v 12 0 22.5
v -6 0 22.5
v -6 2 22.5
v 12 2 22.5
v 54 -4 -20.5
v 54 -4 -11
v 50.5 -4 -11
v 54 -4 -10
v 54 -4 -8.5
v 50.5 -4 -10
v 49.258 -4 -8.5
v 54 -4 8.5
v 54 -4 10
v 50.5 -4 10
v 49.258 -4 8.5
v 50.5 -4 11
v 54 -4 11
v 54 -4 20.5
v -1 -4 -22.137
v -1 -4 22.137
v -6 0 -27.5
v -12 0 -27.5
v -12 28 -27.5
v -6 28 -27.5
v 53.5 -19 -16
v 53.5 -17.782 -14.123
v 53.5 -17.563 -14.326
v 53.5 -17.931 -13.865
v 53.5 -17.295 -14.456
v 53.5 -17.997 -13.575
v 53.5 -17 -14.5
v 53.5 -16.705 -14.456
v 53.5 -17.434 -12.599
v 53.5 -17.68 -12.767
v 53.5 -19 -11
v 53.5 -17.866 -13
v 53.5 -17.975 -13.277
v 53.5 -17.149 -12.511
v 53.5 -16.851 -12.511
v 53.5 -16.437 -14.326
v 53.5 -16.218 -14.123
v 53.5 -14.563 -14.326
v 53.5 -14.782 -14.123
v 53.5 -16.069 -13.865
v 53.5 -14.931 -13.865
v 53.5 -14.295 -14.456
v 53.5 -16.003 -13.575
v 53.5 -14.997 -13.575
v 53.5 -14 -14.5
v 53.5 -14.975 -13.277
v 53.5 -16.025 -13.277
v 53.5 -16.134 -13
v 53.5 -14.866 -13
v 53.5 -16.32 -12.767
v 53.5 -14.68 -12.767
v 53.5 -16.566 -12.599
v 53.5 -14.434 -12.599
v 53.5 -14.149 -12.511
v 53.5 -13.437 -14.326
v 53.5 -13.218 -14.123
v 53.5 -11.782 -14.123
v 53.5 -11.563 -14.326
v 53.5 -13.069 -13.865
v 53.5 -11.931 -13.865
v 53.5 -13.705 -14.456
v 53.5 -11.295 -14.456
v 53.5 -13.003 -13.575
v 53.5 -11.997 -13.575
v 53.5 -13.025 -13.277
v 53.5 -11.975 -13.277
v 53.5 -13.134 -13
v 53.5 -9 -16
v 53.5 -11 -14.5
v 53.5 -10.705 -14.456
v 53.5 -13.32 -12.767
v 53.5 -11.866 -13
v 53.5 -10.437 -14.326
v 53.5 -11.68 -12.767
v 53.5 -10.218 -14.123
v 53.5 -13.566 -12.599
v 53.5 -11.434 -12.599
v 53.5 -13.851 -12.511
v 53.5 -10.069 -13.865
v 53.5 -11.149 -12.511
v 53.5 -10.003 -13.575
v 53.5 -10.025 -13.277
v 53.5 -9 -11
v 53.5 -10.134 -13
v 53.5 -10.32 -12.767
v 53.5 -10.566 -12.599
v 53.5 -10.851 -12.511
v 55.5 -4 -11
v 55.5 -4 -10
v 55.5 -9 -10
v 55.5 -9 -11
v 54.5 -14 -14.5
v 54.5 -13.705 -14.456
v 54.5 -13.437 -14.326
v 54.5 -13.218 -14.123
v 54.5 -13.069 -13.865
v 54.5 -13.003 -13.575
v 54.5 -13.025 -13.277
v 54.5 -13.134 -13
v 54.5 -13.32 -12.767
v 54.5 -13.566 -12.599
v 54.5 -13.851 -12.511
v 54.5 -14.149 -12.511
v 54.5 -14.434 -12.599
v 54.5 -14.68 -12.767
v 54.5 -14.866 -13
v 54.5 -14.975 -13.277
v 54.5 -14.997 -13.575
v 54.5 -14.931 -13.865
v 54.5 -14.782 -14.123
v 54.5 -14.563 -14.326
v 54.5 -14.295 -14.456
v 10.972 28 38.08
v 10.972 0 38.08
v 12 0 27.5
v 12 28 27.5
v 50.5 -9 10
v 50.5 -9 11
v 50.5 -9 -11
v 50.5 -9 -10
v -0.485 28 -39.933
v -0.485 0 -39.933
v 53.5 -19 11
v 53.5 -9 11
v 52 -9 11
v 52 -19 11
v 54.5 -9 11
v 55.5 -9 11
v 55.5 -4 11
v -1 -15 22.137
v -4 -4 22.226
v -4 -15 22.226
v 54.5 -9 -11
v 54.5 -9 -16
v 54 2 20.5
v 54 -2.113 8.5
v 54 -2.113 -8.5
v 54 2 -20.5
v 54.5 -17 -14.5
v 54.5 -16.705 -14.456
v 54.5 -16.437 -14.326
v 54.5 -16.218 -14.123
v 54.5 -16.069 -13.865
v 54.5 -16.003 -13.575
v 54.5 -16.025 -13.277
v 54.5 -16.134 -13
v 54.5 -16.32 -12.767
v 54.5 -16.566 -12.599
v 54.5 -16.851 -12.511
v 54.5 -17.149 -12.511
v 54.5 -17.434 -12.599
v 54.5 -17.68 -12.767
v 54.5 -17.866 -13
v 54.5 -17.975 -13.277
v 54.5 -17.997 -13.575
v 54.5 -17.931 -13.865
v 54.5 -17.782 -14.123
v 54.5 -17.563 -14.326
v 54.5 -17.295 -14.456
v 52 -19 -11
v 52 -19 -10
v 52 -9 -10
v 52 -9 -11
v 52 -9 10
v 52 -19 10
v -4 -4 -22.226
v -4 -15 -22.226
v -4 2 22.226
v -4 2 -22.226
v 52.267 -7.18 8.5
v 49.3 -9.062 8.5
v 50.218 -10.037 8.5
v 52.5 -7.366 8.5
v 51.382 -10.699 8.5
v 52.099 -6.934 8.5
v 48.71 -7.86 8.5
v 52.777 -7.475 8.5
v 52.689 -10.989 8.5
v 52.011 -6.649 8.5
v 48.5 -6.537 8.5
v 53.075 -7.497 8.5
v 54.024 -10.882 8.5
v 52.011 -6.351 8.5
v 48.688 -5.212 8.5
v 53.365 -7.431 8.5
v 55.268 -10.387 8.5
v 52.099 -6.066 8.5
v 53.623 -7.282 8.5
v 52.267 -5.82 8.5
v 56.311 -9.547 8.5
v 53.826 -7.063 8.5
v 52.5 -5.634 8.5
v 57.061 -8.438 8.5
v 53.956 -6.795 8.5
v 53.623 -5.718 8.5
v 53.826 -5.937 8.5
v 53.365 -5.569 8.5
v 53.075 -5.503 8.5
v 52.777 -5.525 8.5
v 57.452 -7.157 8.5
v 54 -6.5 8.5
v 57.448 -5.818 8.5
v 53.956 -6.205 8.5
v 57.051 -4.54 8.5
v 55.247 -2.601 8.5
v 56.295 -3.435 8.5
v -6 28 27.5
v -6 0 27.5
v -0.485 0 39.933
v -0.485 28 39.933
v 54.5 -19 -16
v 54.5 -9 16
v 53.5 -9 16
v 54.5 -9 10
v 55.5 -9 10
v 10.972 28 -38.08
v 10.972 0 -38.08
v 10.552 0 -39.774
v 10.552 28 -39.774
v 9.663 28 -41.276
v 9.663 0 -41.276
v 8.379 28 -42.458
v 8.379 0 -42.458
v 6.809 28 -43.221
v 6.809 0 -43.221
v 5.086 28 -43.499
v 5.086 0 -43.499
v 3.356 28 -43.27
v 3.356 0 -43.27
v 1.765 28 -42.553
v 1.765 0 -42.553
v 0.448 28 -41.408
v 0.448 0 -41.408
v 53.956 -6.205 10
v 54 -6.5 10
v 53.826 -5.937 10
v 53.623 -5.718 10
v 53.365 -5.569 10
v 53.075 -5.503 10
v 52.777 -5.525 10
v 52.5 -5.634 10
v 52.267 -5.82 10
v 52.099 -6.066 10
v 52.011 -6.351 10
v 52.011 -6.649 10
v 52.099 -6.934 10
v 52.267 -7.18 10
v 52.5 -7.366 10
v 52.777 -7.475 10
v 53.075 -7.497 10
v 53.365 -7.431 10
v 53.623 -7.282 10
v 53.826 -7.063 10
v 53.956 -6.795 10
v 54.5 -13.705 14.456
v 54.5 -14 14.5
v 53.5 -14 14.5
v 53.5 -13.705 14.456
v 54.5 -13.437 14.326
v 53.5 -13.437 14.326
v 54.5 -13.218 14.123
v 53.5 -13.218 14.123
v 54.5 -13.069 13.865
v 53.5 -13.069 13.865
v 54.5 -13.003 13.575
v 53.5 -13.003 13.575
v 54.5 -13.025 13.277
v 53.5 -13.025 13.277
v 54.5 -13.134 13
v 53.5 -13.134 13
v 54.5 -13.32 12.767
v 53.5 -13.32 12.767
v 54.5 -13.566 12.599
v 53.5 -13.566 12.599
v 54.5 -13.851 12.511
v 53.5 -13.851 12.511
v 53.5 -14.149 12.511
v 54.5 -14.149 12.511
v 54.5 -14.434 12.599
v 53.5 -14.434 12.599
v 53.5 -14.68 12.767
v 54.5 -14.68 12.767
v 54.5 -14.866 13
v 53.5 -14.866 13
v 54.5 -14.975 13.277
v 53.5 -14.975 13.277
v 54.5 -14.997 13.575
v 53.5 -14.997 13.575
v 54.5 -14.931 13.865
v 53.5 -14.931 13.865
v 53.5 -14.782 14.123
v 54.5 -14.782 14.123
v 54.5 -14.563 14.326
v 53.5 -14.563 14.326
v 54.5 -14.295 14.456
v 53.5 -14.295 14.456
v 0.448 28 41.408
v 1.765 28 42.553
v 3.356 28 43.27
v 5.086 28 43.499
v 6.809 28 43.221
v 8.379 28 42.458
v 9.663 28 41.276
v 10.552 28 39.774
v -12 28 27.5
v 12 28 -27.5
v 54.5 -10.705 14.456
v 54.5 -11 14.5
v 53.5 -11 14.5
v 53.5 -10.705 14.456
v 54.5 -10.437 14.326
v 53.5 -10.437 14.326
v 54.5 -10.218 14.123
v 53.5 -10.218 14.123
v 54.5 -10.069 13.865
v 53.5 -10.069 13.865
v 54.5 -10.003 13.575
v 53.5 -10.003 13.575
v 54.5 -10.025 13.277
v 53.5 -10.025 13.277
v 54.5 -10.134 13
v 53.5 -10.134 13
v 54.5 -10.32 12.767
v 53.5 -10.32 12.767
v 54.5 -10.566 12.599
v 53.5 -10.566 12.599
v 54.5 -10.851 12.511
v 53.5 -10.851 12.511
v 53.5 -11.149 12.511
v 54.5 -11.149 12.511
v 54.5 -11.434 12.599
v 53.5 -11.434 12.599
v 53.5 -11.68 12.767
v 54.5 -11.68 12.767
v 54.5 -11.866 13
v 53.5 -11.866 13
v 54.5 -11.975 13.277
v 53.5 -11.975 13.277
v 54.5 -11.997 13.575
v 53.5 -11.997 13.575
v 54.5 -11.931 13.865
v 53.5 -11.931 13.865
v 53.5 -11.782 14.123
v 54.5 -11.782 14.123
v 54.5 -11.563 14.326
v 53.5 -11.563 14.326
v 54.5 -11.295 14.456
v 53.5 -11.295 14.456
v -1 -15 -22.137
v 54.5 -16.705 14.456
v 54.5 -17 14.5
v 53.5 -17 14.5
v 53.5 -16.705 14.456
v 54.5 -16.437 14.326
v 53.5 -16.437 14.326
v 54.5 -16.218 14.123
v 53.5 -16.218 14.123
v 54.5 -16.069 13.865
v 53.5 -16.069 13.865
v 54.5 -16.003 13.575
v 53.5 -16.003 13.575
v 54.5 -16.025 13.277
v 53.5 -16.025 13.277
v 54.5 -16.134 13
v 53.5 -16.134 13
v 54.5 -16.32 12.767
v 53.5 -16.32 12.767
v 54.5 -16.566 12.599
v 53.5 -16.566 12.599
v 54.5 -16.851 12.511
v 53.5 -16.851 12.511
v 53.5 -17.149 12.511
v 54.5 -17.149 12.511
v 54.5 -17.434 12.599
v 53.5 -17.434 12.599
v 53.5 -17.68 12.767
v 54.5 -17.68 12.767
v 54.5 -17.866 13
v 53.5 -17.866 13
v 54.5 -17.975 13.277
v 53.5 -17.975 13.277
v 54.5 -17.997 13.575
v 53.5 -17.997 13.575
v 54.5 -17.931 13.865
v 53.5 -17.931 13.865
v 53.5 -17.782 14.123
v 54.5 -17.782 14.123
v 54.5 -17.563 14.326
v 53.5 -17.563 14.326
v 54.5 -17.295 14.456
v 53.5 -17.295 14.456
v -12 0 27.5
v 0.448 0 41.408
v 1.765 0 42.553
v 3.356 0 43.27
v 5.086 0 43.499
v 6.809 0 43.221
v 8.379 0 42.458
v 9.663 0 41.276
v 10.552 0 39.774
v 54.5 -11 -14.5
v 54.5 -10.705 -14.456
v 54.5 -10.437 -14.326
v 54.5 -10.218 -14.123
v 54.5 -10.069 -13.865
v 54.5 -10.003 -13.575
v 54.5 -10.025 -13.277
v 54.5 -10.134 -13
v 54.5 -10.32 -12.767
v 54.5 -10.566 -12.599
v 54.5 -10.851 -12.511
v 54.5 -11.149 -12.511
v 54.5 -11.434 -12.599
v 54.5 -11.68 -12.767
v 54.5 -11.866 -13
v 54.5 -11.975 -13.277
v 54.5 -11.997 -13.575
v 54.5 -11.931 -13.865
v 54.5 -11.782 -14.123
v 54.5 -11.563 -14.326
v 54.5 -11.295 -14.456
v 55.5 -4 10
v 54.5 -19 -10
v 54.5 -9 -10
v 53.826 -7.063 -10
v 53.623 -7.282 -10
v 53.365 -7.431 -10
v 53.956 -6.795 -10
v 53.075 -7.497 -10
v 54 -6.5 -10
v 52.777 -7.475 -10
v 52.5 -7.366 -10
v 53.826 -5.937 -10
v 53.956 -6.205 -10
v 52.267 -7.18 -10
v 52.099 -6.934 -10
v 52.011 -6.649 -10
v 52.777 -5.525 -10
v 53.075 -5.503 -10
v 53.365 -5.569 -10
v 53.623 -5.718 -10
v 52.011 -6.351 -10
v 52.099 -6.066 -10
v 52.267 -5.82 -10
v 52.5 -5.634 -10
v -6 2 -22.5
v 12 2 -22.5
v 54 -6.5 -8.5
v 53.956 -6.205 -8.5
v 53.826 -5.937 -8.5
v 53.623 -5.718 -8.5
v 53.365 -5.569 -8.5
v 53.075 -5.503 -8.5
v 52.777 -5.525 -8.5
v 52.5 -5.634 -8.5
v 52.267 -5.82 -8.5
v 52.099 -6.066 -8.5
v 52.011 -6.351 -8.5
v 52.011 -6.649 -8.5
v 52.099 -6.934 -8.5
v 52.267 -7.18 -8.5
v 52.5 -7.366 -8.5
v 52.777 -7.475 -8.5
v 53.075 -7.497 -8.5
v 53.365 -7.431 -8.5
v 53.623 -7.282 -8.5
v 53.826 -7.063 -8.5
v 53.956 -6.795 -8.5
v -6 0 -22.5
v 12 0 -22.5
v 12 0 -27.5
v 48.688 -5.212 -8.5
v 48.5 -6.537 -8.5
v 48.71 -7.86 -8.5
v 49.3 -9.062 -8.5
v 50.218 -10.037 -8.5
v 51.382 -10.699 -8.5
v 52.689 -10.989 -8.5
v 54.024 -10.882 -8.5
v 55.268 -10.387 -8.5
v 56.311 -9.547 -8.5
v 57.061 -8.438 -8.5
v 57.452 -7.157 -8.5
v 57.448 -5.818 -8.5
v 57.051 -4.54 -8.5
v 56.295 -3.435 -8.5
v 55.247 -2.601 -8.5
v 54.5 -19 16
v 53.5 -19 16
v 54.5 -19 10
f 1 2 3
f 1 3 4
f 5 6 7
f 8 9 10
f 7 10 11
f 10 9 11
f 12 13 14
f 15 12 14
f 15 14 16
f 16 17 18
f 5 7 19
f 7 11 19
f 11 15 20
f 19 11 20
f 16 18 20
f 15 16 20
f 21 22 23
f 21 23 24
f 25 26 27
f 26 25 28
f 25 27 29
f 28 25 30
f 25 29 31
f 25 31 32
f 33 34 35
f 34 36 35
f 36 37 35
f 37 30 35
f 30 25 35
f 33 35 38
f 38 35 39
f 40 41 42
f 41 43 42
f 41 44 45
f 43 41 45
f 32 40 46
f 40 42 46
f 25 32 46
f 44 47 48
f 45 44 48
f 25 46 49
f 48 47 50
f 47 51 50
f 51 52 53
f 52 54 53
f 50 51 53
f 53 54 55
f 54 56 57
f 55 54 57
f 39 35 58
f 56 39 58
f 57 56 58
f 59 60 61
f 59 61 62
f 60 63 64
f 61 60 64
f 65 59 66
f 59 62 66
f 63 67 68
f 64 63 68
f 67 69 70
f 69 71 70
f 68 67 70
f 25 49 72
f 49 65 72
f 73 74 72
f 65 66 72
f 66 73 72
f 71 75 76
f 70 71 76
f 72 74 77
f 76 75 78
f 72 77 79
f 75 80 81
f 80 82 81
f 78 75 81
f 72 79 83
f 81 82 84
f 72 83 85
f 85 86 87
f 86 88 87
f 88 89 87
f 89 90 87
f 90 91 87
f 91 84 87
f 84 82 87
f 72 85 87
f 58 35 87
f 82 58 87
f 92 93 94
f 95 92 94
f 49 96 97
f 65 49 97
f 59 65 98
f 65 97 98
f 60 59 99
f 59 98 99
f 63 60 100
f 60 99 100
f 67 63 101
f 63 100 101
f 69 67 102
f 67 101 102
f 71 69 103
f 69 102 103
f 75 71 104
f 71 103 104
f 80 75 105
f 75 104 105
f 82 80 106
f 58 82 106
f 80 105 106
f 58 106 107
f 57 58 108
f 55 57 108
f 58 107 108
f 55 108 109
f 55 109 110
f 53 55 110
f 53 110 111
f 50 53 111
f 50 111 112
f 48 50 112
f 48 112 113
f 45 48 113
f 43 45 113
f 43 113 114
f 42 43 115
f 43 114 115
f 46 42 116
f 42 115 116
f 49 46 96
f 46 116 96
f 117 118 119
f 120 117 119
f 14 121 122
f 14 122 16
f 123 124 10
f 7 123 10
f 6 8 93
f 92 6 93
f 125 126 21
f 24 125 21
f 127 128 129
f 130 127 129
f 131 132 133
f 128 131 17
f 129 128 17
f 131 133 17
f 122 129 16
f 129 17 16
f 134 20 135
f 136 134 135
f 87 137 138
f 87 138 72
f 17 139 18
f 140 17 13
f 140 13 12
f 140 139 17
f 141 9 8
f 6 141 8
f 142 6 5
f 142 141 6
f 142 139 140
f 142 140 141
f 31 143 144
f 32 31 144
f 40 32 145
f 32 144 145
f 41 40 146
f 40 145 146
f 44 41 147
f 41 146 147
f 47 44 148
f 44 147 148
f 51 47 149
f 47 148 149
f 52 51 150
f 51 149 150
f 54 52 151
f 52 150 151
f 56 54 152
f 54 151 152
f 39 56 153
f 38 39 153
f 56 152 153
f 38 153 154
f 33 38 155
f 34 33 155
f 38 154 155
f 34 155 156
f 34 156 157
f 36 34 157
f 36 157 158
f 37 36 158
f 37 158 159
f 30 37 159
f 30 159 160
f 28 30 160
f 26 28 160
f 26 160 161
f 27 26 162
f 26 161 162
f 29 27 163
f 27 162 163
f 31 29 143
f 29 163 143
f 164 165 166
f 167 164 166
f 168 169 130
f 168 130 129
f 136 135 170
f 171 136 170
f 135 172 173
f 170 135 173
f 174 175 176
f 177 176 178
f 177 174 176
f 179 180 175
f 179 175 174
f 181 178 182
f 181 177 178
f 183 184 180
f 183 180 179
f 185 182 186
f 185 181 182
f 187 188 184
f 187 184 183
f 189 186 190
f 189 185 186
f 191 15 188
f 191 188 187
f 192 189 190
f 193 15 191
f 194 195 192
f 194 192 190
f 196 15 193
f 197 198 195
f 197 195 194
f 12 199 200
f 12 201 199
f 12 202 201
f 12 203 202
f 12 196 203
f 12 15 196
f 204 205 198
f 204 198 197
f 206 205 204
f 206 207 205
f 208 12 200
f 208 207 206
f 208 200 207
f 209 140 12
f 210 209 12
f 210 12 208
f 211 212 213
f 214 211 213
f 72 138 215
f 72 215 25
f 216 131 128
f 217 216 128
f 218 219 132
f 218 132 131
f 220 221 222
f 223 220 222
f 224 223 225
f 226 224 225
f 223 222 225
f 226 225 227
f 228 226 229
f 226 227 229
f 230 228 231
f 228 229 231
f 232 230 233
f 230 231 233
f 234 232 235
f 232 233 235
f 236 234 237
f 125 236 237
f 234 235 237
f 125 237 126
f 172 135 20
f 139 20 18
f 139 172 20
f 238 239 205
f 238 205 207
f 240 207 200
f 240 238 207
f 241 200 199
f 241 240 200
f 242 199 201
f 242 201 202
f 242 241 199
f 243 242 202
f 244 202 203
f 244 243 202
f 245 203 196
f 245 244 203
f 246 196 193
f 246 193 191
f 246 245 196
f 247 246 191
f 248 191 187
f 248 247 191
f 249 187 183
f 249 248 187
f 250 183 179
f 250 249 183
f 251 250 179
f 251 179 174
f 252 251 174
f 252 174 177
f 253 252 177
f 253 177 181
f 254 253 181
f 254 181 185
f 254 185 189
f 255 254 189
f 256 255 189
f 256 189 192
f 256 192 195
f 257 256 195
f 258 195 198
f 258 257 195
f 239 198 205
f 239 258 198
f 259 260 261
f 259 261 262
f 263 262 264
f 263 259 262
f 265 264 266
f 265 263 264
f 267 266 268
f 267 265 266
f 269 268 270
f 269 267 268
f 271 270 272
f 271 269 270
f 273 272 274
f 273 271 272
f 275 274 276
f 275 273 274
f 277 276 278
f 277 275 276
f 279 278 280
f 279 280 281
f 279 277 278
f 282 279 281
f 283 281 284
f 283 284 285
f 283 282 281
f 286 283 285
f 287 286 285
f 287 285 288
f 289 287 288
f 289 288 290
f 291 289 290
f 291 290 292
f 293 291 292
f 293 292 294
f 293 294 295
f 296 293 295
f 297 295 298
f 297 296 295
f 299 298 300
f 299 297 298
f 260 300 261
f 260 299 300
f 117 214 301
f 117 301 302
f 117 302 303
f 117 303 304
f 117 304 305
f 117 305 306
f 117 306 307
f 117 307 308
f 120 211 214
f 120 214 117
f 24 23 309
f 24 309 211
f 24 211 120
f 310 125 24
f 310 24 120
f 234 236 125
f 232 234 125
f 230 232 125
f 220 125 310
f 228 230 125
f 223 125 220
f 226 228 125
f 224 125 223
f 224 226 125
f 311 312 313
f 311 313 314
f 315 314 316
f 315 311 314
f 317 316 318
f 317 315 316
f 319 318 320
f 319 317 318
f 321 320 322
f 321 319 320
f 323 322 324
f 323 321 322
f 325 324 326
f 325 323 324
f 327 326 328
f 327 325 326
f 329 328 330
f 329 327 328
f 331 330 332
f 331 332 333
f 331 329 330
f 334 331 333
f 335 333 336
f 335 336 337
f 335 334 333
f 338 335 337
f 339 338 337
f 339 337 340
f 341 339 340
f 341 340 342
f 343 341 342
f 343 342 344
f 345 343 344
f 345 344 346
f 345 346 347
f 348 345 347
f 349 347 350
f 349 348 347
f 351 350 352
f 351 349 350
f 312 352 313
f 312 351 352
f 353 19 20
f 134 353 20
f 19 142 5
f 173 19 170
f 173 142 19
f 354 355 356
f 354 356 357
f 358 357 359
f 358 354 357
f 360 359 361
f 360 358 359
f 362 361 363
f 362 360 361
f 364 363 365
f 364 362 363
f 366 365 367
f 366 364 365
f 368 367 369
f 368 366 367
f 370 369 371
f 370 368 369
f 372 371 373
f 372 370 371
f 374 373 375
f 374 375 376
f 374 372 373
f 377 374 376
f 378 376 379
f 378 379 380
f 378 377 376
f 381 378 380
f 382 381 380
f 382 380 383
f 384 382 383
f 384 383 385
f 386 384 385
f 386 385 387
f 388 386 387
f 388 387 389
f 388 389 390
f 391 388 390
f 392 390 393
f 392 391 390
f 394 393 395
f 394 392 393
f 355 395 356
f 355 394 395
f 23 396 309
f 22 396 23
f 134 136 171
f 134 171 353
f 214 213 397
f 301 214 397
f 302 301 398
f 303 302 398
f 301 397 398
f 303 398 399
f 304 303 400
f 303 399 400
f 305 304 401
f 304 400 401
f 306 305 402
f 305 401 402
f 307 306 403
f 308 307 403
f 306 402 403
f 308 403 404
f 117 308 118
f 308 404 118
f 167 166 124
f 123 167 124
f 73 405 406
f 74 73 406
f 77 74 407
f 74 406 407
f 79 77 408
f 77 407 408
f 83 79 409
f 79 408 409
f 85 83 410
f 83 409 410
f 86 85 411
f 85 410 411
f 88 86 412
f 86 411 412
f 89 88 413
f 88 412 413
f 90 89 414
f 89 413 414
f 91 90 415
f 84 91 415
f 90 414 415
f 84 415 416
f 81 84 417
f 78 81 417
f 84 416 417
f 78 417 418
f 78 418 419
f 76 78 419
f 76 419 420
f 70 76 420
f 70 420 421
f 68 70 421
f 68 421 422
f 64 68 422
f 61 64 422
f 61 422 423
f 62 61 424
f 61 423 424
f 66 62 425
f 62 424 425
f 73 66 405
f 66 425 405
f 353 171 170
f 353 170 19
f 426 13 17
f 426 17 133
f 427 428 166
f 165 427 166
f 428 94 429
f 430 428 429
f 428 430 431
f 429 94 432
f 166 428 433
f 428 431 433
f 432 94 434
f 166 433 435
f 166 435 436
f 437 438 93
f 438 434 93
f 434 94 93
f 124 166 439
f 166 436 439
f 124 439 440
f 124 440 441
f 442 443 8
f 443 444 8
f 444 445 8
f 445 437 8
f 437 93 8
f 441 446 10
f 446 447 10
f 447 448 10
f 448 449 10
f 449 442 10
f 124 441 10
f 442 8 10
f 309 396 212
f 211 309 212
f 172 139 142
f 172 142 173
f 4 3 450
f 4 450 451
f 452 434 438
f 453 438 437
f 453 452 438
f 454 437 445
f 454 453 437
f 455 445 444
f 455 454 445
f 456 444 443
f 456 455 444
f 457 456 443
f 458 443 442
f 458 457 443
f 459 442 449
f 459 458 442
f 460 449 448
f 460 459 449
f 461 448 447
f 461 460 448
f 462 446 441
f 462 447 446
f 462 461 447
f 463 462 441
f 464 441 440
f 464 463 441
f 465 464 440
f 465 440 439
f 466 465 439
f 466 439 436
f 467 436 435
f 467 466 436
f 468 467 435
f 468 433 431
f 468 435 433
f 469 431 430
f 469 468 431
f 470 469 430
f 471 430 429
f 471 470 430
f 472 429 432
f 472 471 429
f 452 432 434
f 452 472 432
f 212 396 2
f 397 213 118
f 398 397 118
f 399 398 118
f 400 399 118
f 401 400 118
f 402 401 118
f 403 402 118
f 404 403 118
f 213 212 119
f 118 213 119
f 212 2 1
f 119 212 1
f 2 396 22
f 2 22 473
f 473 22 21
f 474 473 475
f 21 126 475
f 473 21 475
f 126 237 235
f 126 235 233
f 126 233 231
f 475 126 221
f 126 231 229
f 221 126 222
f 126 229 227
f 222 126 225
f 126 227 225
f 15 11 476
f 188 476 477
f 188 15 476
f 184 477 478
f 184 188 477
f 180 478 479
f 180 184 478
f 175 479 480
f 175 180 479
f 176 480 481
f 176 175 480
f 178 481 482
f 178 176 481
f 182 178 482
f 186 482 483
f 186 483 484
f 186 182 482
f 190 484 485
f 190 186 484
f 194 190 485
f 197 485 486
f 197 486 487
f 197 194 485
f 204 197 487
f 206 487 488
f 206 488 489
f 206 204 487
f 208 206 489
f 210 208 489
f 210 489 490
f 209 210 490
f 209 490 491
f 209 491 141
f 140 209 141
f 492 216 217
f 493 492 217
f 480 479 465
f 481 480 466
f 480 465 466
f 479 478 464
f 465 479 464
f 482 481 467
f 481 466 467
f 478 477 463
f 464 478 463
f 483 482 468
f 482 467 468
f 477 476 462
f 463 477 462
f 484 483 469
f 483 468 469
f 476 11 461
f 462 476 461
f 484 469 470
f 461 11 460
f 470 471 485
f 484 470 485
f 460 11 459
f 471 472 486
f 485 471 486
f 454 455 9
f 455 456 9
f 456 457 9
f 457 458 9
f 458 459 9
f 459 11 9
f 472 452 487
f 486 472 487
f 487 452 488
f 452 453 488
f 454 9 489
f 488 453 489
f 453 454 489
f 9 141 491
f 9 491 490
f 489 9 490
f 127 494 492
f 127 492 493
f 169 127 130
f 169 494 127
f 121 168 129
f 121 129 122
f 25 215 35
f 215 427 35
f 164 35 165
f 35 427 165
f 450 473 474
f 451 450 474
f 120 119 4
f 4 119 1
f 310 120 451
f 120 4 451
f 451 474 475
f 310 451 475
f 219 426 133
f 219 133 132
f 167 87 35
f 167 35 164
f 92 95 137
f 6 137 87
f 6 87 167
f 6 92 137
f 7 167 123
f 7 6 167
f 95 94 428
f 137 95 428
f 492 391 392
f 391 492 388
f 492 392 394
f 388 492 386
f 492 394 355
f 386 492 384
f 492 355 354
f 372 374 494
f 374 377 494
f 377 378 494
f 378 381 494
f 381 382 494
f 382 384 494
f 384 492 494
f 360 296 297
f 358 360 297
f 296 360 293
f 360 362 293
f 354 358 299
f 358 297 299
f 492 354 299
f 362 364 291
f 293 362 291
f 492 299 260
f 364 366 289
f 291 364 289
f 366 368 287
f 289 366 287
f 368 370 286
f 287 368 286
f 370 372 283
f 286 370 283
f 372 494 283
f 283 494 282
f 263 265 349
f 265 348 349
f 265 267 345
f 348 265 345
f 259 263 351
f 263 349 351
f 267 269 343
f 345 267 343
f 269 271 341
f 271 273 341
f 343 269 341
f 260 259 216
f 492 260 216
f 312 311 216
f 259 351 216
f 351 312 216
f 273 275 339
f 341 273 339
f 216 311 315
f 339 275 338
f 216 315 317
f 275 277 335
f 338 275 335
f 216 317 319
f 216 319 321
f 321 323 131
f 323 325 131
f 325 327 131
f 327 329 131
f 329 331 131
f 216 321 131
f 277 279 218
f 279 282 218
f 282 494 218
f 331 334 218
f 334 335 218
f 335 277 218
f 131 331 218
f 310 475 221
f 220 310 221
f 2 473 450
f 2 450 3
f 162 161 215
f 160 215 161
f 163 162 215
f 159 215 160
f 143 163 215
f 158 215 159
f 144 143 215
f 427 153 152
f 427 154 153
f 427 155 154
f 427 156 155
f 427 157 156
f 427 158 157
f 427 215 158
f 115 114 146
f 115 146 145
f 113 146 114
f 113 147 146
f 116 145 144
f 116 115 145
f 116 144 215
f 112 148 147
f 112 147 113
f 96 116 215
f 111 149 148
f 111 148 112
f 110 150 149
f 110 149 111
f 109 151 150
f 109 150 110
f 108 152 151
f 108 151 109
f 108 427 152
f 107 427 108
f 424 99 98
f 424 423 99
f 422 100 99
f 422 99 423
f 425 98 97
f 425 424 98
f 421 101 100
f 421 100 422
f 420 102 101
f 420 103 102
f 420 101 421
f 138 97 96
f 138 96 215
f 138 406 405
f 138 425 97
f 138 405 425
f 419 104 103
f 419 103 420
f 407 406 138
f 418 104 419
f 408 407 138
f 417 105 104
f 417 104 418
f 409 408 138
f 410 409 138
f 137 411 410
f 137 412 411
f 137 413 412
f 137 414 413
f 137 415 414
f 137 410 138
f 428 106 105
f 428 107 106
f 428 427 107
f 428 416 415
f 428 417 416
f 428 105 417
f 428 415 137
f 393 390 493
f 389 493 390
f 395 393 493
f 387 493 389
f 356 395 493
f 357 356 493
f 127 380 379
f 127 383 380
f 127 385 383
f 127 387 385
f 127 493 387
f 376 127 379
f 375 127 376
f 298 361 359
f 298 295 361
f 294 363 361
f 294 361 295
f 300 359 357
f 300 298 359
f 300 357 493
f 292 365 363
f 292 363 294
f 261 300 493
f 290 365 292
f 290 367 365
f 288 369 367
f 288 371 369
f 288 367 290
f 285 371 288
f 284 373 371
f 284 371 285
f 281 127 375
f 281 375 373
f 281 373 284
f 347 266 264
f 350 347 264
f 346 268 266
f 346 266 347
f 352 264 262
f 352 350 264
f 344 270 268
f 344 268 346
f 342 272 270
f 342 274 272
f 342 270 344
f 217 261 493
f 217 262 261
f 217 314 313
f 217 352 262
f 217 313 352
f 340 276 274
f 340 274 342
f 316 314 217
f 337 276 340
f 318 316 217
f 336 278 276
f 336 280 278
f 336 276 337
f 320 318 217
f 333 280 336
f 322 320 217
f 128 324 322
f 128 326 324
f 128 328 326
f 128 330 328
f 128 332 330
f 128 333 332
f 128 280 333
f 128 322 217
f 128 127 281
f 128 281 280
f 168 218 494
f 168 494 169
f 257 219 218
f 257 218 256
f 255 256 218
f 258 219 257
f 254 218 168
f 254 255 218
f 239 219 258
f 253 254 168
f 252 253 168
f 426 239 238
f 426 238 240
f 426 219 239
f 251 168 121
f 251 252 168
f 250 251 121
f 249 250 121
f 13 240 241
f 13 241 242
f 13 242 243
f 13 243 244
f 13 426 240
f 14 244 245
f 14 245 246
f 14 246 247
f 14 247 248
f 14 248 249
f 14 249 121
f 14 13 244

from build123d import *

# Parameters (mm, degrees)
SKETCH_1_W          = 24
SKETCH_1_H          = 55
SKETCH_1_R          = 6
EXTRUDE_1_DEPTH     = 28
SKETCH_2_W          = 18
SKETCH_2_H          = 45
CUT_EXTRUDE_1_DEPTH = 2
EXTRUDE_2_DEPTH     = 6
EXTRUDE_3_DEPTH     = 11
SKETCH_5_R          = 4.5
EXTRUDE_4_DEPTH     = 8.5
SKETCH_7_R          = 1
EXTRUDE_5_DEPTH     = 11
EXTRUDE_START       = 1.5
SKETCH_8_R          = 1
EXTRUDE_6_DEPTH     = 1
SKETCH_9_W          = 1
SKETCH_9_H          = 10
EXTRUDE_7_DEPTH     = 5
SKETCH_10_R         = 1
CUT_EXTRUDE_2_DEPTH = 1


with BuildPart() as part:
    # Эскиз1 → Бобышка-Вытянуть1 (new body)
    with BuildSketch(Plane(origin=(0, 0, 0), x_dir=(1, 0, 0), z_dir=(0, 1, 0))):
        Rectangle(SKETCH_1_W, SKETCH_1_H)
        with Locations((5, 37.5)):
            Circle(SKETCH_1_R)
        with BuildLine():
            Line((10.971870797, -38.080309558), (12, -27.5))
            Line((12, -27.5), (-6, -27.5))
            Line((-6, -27.5), (-0.484562129, -39.933018342))
            ThreePointArc((-0.484562129, -39.933018342), (3.75649141, -31.630273738), (11, -37.5))
            ThreePointArc((11, -37.5), (10.992963573, -37.790495454), (10.971870797, -38.080309558))
        make_face()
        with Locations((5, -37.5)):
            Circle(SKETCH_1_R)
        with BuildLine():
            Line((-6, 27.5), (12, 27.5))
            Line((12, 27.5), (10.971870797, 38.080309558))
            ThreePointArc((10.971870797, 38.080309558), (10.992963573, 37.790495454), (11, 37.5))
            ThreePointArc((11, 37.5), (3.75649141, 31.630273738), (-0.484562129, 39.933018342))
            Line((-0.484562129, 39.933018342), (-6, 27.5))
        make_face()
    extrude(amount=EXTRUDE_1_DEPTH)

    # Эскиз2 → Вырез-Вытянуть1 (cut)
    with BuildSketch(Plane.XZ):
        with Locations((3, 0)):
            Rectangle(SKETCH_2_W, SKETCH_2_H)
    extrude(amount=-CUT_EXTRUDE_1_DEPTH, mode=Mode.SUBTRACT)


with BuildPart() as body_2:
    # Эскиз3 → Бобышка-Вытянуть2 (new body)
    with BuildSketch(Plane.XZ.offset(-2)):
        Polygon((-4, 22.226190476), (54, 20.5), (54, -20.5), (-4, -22.226190476), align=None)
    extrude(amount=EXTRUDE_2_DEPTH)

    # Эскиз4 → Бобышка-Вытянуть3 (add)
    with BuildSketch(Plane.XZ.offset(4)):
        Polygon((-1, 22.136904762), (-4, 22.226190476), (-4, -22.226190476), (-1, -22.136904762), align=None)
    extrude(amount=EXTRUDE_3_DEPTH)

    # Эскиз5 → Бобышка-Вытянуть4 (add, symmetric)
    with BuildSketch(Plane.XY):
        with Locations((53, -6.5)):
            Circle(SKETCH_5_R)
    extrude(amount=EXTRUDE_4_DEPTH, both=True)

    # Эскиз7 → Бобышка-Вытянуть5 (add, symmetric)
    with BuildSketch(Plane.XY):
        with Locations((53, -6.5)):
            Circle(SKETCH_7_R)
    extrude(amount=EXTRUDE_5_DEPTH, both=True)

    # Эскиз8 → Бобышка-Вытянуть6 (add)
    # profile 1 of 3: a face of its own
    with BuildSketch(Plane(origin=(0, 0, -8.5), x_dir=(-1, 0, 0), z_dir=(0, 0, -1)).offset(EXTRUDE_START)):
        with BuildLine():
            Line((-52, -9), (-54.5, -9))
            Line((-54.5, -9), (-54.5, -10.742640687))
            ThreePointArc((-54.5, -10.742640687), (-53.260278246, -10.992466498), (-52, -10.887482194))
            Line((-52, -10.887482194), (-52, -9))
        make_face()
    # profile 2 of 3: a face of its own
    with BuildSketch(Plane(origin=(0, 0, -8.5), x_dir=(-1, 0, 0), z_dir=(0, 0, -1)).offset(EXTRUDE_START)):
        Polygon((-55.5, -9), (-54.5, -9), (-52, -9), (-50.5, -9), (-50.5, -4), (-54, -4), (-55.5, -4), align=None)
        with Locations((-53, -6.5)):
            Circle(SKETCH_8_R, mode=Mode.SUBTRACT)
    # profile 3 of 3: a face of its own
    with BuildSketch(Plane(origin=(0, 0, -8.5), x_dir=(-1, 0, 0), z_dir=(0, 0, -1)).offset(EXTRUDE_START)):
        with BuildLine():
            ThreePointArc((-52, -10.887482194), (-53.260278246, -10.992466498), (-54.5, -10.742640687))
            Line((-54.5, -10.742640687), (-54.5, -19))
            Line((-54.5, -19), (-52, -19))
            Line((-52, -19), (-52, -10.887482194))
        make_face()
    extrude_6 = extrude(amount=EXTRUDE_6_DEPTH)

    # Зеркальное отражение1: Бобышка-Вытянуть6 across plane
    add(extrude_6.mirror(Plane.XY))

    # Эскиз9 → Бобышка-Вытянуть7 (add)
    with BuildSketch(Plane(origin=(0, 0, -11), x_dir=(-1, 0, 0), z_dir=(0, 0, -1))):
        with Locations((-54, -14)):
            Rectangle(SKETCH_9_W, SKETCH_9_H)
    extrude_7 = extrude(amount=EXTRUDE_7_DEPTH)

    # Зеркальное отражение2: Бобышка-Вытянуть7 across plane
    add(extrude_7.mirror(Plane.XY))

    # Эскиз10 → Вырез-Вытянуть2 (cut)
    with BuildSketch(Plane(origin=(54.5, 0, 0), x_dir=(0, 0, -1), z_dir=(1, 0, 0))):
        with Locations((13.5, -11)):
            Circle(SKETCH_10_R)
        with Locations((13.5, -14)):
            Circle(SKETCH_10_R)
        with Locations((13.5, -17)):
            Circle(SKETCH_10_R)
    cut_extrude_2 = extrude(amount=-CUT_EXTRUDE_2_DEPTH, mode=Mode.SUBTRACT)

    # Зеркальное отражение3: Вырез-Вытянуть2 across plane
    add(cut_extrude_2.mirror(Plane.XY), mode=Mode.SUBTRACT)


solid = Compound([part.part, body_2.part])
